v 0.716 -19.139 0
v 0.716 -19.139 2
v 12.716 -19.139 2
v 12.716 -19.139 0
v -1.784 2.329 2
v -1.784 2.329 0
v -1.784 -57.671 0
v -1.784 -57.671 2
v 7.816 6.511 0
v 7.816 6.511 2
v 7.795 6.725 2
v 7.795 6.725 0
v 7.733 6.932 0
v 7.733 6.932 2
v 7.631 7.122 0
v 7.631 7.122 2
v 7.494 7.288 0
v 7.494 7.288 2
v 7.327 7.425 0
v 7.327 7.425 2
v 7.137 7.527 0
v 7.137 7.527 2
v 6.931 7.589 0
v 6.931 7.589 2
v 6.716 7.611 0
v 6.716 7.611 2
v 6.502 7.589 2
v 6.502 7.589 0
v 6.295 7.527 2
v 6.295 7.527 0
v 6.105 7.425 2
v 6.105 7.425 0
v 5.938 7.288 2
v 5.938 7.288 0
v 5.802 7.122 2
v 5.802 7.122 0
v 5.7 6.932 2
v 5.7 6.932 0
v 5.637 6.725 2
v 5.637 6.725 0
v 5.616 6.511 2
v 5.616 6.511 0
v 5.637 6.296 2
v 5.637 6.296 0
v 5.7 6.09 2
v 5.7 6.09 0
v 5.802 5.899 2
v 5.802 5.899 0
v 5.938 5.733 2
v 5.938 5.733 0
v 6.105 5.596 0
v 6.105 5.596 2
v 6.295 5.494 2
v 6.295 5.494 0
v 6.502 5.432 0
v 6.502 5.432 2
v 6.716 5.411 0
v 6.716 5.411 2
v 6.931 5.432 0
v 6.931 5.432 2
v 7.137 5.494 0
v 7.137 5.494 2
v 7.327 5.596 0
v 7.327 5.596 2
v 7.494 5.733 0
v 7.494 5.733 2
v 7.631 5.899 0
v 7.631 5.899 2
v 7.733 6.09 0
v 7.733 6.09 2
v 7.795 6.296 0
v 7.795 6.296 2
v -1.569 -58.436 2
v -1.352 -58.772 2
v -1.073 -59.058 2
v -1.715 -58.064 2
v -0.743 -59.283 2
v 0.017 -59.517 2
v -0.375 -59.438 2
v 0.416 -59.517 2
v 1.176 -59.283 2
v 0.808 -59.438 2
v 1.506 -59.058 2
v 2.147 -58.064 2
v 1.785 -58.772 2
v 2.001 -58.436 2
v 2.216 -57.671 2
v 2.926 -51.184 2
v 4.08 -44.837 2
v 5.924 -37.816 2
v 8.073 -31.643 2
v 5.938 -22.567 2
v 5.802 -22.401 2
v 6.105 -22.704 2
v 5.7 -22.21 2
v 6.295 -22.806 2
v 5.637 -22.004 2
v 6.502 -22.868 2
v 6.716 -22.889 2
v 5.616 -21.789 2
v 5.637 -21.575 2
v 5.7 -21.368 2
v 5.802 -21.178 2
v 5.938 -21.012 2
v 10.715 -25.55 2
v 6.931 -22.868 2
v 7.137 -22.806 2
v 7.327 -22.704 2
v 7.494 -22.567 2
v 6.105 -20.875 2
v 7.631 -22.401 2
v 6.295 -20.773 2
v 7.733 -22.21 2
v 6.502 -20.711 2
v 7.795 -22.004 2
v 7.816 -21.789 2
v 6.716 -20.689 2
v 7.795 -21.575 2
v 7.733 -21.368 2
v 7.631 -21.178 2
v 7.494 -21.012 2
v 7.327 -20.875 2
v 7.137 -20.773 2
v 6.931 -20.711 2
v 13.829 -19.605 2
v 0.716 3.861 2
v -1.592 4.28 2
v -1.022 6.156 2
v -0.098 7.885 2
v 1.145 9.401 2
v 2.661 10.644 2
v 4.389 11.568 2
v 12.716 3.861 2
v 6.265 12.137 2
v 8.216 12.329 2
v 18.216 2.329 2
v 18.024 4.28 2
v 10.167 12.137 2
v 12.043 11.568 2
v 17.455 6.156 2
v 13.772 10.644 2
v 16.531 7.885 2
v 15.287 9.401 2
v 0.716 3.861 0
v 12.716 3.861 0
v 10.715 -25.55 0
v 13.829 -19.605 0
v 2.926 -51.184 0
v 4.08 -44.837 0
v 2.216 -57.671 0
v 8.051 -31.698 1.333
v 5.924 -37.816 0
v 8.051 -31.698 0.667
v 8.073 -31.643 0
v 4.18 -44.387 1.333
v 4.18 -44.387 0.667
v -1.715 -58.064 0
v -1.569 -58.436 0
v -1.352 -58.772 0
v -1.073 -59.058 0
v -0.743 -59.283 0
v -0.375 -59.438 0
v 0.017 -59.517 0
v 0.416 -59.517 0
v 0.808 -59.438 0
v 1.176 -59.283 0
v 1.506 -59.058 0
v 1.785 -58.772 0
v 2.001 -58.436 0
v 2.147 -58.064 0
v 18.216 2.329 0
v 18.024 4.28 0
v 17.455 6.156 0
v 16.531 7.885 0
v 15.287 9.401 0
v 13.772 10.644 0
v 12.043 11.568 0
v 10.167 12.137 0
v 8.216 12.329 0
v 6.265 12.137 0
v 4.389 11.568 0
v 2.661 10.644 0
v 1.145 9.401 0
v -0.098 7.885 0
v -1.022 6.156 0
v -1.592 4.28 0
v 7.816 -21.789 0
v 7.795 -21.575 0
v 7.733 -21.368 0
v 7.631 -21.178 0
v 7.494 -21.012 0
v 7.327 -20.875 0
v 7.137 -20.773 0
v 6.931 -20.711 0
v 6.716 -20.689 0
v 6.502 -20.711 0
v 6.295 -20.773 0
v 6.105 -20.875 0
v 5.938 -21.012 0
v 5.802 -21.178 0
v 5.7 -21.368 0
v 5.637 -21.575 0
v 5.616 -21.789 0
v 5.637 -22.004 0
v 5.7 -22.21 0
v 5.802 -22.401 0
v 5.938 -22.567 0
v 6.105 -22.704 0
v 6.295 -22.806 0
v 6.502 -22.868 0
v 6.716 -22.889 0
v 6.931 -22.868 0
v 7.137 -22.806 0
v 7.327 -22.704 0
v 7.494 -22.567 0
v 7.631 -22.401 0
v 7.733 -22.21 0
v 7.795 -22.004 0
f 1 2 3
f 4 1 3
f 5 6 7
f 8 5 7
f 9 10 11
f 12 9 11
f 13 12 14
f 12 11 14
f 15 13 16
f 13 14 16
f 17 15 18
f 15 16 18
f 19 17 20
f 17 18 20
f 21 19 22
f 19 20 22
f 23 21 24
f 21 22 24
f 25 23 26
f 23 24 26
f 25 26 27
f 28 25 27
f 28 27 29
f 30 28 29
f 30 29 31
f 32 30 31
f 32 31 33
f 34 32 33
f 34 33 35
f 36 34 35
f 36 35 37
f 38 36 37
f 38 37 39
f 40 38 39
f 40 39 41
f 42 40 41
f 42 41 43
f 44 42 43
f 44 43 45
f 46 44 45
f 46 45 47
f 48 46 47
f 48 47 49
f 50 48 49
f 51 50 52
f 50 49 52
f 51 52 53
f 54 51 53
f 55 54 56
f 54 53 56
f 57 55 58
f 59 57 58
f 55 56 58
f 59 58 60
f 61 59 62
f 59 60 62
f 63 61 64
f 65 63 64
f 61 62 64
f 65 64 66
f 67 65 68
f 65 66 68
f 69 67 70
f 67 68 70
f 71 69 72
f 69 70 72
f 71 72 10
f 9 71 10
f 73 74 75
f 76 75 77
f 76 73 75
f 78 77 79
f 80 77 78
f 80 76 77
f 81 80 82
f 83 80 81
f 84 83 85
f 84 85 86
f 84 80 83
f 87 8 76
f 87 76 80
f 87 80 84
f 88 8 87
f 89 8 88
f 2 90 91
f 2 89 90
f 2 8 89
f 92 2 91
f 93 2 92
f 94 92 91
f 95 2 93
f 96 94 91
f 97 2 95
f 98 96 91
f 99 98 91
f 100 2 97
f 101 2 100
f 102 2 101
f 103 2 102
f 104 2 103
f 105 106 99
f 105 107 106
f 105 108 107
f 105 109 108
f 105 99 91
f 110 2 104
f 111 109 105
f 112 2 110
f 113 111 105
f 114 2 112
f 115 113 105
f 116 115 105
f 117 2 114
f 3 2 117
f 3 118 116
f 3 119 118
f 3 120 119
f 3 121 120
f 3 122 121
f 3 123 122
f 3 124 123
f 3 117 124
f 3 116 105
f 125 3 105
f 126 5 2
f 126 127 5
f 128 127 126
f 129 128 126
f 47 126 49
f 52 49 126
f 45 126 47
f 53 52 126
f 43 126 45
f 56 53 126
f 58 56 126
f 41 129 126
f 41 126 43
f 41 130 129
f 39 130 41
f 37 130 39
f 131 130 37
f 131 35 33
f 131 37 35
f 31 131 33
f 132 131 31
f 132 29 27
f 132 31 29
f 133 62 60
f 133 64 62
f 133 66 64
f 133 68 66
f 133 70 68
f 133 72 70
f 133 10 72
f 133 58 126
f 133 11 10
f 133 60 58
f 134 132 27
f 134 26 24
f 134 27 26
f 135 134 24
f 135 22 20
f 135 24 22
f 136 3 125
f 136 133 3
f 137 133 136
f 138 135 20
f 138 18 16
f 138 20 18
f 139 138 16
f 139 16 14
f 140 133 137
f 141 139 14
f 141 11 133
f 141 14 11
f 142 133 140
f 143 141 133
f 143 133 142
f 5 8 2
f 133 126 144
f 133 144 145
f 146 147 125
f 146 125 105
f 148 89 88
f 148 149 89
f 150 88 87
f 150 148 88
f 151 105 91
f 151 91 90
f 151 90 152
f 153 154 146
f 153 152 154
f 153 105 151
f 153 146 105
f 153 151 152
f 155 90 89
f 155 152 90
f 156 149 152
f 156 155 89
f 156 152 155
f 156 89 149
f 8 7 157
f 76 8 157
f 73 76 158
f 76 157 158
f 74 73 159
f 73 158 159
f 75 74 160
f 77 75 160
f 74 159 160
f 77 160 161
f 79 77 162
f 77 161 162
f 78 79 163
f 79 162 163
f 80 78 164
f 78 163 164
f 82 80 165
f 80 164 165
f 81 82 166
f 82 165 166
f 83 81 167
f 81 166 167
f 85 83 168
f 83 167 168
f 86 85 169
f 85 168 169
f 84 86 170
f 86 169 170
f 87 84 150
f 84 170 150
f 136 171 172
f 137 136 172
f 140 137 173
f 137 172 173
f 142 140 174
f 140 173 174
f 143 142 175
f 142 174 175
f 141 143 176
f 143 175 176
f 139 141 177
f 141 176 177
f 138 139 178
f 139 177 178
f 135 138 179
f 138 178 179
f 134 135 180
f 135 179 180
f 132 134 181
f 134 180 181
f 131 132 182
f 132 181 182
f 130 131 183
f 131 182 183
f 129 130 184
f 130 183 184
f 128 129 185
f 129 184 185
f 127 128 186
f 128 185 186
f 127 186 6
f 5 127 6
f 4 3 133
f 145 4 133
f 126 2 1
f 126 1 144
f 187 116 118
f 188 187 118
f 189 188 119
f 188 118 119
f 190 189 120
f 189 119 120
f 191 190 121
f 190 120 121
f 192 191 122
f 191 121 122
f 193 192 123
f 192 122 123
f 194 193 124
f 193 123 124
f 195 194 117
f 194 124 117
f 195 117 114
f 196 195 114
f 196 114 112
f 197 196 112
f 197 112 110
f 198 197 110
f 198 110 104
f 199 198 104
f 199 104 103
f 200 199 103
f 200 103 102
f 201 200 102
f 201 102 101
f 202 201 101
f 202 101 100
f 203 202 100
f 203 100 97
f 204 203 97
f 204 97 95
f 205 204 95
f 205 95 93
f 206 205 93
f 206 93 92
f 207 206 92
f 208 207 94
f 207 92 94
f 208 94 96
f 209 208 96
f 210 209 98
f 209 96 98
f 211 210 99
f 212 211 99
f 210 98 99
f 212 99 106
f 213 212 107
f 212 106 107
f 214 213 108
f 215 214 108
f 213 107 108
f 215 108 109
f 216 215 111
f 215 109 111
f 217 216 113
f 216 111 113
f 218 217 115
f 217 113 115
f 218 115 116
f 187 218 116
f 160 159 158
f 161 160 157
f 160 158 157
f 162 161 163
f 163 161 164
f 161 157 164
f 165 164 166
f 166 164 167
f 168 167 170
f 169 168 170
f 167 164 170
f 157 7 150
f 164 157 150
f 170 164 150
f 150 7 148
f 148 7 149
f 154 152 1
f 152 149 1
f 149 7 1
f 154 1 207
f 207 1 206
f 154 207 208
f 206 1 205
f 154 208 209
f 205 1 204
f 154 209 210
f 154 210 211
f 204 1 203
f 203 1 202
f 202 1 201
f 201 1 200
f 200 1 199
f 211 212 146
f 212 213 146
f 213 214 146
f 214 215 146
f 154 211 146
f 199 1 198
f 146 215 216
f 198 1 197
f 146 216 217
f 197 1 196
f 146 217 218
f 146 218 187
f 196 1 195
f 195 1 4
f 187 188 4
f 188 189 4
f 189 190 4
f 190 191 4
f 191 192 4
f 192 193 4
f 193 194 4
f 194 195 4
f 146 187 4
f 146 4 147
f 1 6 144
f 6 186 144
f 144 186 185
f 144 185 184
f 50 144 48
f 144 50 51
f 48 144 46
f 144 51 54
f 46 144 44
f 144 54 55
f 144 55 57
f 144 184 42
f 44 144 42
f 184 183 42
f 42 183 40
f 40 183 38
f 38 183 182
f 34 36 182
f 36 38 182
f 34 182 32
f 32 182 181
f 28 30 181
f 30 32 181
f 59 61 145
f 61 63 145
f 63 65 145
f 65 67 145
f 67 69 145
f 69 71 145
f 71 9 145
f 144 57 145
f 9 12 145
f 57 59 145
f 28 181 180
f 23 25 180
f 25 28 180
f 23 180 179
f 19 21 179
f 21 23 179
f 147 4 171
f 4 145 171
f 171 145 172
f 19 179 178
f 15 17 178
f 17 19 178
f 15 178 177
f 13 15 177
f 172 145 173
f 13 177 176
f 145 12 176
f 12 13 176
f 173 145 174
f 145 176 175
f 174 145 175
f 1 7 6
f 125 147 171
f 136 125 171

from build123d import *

# Parameters (mm, degrees)
BOSS_EXTRUDE1_DEPTH = 2
CUT_EXTRUDE1_REACH  = 64.284
SKETCH2_R           = 1.1
SKETCH2_W           = 12
SKETCH2_H           = 23


with BuildPart() as part:
    # Sketch1 → Boss-Extrude1 (new body)
    with BuildSketch(Plane.XY):
        with BuildLine():
            Line((-1.783693844, 2.329450915), (-1.783693844, -57.670549085))
            ThreePointArc((-1.783693844, -57.670549085), (0.216306156, -59.527300355), (2.216306156, -57.670549085))
            add(Edge.make_bspline(
                [(13.829397999, -19.605089871), (7.097626367, -31.400579811), (3.226595753, -44.089066216), (2.216306156, -57.670549085)],
                knots=[0, 0, 0, 0, 1, 1, 1, 1], degree=3))
            Line((13.829397999, -19.605089871), (18.216306156, 2.329450915))
            ThreePointArc((18.216306156, 2.329450915), (8.216306156, 12.329450915), (-1.783693844, 2.329450915))
        make_face()
    extrude(amount=BOSS_EXTRUDE1_DEPTH)

    # Sketch2 → Cut-Extrude1 (cut, up to next)
    with BuildSketch(Plane.XY.offset(2), mode=Mode.PRIVATE) as cut_extrude1_sk1:
        with Locations((6.716306156, 6.510600008)):
            Circle(SKETCH2_R)
    cut_extrude1_tool1 = extrude(cut_extrude1_sk1.sketch, amount=-CUT_EXTRUDE1_REACH, mode=Mode.PRIVATE) & part.part
    # Sketch2 → Cut-Extrude1 (cut, up to next)
    with BuildSketch(Plane.XY.offset(2), mode=Mode.PRIVATE) as cut_extrude1_sk2:
        with Locations((6.716306156, -21.789399992)):
            Circle(SKETCH2_R)
    cut_extrude1_tool2 = extrude(cut_extrude1_sk2.sketch, amount=-CUT_EXTRUDE1_REACH, mode=Mode.PRIVATE) & part.part
    # Sketch2 → Cut-Extrude1 (cut, up to next)
    with BuildSketch(Plane.XY.offset(2), mode=Mode.PRIVATE) as cut_extrude1_sk3:
        with Locations((6.716306156, -7.639399992)):
            Rectangle(SKETCH2_W, SKETCH2_H)
    cut_extrude1_tool3 = extrude(cut_extrude1_sk3.sketch, amount=-CUT_EXTRUDE1_REACH, mode=Mode.PRIVATE) & part.part
    add(cut_extrude1_tool1.solids().sort_by_distance((6.716306, 6.5106, 2))[0], mode=Mode.SUBTRACT)
    add(cut_extrude1_tool2.solids().sort_by_distance((6.716306, -21.7894, 2))[0], mode=Mode.SUBTRACT)
    add(cut_extrude1_tool3.solids().sort_by_distance((6.716306, -7.6394, 2))[0], mode=Mode.SUBTRACT)


solid = part.part
